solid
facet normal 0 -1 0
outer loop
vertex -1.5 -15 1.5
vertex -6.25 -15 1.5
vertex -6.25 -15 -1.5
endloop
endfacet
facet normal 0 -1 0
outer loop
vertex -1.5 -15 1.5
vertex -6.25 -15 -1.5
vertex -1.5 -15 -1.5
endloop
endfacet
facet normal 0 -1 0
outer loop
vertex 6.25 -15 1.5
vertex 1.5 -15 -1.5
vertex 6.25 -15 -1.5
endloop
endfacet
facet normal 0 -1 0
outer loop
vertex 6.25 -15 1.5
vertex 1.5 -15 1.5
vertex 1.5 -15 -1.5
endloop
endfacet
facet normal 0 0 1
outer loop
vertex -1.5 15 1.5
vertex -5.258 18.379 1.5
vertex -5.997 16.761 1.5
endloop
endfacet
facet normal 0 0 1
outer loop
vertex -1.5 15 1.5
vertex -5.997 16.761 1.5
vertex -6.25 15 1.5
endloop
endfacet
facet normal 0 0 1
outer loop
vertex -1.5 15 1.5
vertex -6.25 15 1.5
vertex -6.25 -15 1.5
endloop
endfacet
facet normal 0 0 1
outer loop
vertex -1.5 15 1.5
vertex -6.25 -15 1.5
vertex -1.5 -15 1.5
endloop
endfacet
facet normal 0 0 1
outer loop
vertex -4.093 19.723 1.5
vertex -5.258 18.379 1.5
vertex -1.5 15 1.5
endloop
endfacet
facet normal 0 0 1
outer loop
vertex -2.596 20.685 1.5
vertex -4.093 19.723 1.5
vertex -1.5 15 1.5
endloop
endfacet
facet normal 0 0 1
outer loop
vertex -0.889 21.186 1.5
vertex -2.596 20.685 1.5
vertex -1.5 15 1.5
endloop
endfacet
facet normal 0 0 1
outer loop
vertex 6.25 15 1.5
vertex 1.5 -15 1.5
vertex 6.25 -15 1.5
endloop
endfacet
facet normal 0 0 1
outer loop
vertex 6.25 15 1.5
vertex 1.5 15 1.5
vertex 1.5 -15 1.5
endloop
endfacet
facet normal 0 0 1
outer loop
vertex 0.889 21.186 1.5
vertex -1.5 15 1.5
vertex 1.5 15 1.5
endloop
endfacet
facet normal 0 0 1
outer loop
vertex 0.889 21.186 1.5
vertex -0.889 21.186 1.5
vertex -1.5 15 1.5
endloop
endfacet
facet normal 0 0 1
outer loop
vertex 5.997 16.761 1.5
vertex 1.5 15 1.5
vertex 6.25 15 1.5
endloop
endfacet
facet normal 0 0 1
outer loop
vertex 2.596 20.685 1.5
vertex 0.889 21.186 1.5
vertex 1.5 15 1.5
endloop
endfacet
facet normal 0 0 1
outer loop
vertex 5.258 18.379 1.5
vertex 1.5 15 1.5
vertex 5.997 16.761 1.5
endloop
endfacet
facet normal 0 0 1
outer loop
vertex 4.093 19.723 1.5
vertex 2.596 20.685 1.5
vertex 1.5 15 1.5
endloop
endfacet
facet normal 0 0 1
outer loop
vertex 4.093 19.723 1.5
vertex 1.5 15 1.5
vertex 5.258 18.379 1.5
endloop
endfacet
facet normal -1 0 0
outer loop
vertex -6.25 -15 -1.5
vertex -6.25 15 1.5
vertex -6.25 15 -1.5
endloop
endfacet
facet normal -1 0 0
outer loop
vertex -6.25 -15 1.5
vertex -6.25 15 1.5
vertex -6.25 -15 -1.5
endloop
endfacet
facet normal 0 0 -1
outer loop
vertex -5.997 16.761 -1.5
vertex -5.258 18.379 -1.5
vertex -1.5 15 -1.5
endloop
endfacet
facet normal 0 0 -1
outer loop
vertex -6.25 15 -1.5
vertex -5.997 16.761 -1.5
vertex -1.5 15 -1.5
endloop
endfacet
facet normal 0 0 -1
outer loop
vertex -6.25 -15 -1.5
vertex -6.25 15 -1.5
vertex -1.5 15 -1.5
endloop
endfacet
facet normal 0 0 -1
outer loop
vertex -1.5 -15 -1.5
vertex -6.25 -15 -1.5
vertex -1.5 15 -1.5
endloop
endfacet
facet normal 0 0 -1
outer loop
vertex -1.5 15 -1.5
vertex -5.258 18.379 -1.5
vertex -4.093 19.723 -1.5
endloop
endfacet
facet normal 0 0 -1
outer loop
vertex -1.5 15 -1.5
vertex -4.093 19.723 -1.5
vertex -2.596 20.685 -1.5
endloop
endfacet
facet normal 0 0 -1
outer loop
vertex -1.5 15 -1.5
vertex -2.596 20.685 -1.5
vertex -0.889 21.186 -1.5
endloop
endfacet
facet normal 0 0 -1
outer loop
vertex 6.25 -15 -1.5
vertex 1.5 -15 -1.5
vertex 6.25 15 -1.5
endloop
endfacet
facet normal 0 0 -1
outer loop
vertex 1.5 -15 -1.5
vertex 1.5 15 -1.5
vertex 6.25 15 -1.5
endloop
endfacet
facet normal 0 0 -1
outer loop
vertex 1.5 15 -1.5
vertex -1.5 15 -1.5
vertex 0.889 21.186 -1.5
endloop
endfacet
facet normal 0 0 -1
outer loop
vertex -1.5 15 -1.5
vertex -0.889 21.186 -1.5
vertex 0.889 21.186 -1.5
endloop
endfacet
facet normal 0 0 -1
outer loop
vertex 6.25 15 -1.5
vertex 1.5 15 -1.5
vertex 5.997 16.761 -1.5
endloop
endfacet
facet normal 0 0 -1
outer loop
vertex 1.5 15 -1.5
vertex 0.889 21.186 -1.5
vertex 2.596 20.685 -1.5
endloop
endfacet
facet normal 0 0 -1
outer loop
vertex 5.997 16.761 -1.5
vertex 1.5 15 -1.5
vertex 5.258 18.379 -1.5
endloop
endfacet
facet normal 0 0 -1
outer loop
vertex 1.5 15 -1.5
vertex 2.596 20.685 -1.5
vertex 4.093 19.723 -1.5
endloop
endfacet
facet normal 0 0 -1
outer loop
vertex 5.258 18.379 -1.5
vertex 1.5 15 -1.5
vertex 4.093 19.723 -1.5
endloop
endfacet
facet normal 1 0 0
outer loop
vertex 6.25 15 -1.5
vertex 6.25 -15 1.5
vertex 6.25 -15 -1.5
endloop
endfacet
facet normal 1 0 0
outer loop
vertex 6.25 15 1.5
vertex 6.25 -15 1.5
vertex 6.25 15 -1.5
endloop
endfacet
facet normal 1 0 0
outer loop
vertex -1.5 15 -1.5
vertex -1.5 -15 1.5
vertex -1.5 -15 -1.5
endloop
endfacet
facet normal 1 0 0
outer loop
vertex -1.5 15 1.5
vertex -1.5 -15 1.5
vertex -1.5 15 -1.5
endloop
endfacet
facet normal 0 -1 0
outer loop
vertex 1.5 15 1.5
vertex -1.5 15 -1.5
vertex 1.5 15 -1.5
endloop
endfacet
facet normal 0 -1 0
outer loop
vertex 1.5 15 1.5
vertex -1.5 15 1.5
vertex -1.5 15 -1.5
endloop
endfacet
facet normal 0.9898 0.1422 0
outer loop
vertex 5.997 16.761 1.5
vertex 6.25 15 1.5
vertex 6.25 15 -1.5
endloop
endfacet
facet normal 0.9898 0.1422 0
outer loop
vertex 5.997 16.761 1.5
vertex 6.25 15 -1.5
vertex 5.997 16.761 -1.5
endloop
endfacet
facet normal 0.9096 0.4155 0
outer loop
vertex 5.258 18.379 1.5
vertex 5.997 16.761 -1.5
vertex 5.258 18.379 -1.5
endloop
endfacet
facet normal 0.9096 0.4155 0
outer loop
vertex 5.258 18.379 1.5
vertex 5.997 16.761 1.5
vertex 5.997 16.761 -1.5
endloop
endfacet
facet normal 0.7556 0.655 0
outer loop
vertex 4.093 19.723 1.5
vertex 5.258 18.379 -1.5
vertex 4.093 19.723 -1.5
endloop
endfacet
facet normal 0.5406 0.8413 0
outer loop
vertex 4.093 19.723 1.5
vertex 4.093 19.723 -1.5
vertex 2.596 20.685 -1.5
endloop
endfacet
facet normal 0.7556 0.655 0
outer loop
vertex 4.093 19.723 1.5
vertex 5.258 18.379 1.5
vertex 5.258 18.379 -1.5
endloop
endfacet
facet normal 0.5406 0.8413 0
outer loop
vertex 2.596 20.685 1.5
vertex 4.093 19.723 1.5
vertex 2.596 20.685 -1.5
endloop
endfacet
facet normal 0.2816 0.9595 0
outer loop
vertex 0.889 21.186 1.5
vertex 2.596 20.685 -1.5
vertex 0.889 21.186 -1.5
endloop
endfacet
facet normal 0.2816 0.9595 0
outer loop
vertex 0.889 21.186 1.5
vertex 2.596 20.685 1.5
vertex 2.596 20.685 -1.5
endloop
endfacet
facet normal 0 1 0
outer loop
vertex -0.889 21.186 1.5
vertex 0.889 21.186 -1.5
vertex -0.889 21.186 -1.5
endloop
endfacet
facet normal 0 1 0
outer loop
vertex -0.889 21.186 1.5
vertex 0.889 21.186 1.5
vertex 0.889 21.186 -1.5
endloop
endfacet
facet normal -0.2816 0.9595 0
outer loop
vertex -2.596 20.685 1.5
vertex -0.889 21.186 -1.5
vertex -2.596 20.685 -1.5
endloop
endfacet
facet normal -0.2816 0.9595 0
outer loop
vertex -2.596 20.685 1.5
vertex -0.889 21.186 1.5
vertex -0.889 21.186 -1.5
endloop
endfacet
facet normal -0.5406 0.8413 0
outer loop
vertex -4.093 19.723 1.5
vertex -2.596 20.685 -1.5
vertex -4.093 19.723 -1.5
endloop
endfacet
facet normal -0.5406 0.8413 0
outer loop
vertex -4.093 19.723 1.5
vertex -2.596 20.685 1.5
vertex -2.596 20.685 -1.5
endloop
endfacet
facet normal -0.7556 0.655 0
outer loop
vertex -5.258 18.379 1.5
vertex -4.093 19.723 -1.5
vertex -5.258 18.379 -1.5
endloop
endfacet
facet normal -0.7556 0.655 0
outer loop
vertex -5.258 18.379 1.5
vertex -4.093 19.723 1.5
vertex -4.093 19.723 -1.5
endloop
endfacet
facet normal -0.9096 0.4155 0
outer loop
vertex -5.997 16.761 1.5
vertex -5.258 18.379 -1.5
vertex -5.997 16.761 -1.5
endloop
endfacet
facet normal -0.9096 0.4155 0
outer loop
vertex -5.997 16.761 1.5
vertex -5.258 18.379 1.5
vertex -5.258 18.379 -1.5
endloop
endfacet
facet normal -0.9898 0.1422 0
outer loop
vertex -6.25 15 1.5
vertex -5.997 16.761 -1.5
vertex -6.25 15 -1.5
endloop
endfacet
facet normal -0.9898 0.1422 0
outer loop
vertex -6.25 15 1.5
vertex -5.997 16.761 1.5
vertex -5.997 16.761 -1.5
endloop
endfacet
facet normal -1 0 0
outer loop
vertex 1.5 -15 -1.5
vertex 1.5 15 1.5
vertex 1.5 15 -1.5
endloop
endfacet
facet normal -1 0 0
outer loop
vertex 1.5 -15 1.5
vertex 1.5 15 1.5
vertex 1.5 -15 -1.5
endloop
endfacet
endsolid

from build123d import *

# Parameters (mm, degrees)
BOSS_EXTRUDE1_DEPTH = 1.5


with BuildPart() as part:
    # Sketch1 → Boss-Extrude1 (new body, symmetric)
    with BuildSketch(Plane.XY):
        with BuildLine():
            Line((1.5, -15), (6.25, -15))
            Line((6.25, -15), (6.25, 15))
            ThreePointArc((6.25, 15), (0, 21.25), (-6.25, 15))
            Line((-6.25, 15), (-6.25, -15))
            Line((-6.25, -15), (-1.5, -15))
            Line((-1.5, -15), (-1.5, 15))
            Line((-1.5, 15), (1.5, 15))
            Line((1.5, 15), (1.5, -15))
        make_face()
    extrude(amount=BOSS_EXTRUDE1_DEPTH, both=True)


solid = part.part
